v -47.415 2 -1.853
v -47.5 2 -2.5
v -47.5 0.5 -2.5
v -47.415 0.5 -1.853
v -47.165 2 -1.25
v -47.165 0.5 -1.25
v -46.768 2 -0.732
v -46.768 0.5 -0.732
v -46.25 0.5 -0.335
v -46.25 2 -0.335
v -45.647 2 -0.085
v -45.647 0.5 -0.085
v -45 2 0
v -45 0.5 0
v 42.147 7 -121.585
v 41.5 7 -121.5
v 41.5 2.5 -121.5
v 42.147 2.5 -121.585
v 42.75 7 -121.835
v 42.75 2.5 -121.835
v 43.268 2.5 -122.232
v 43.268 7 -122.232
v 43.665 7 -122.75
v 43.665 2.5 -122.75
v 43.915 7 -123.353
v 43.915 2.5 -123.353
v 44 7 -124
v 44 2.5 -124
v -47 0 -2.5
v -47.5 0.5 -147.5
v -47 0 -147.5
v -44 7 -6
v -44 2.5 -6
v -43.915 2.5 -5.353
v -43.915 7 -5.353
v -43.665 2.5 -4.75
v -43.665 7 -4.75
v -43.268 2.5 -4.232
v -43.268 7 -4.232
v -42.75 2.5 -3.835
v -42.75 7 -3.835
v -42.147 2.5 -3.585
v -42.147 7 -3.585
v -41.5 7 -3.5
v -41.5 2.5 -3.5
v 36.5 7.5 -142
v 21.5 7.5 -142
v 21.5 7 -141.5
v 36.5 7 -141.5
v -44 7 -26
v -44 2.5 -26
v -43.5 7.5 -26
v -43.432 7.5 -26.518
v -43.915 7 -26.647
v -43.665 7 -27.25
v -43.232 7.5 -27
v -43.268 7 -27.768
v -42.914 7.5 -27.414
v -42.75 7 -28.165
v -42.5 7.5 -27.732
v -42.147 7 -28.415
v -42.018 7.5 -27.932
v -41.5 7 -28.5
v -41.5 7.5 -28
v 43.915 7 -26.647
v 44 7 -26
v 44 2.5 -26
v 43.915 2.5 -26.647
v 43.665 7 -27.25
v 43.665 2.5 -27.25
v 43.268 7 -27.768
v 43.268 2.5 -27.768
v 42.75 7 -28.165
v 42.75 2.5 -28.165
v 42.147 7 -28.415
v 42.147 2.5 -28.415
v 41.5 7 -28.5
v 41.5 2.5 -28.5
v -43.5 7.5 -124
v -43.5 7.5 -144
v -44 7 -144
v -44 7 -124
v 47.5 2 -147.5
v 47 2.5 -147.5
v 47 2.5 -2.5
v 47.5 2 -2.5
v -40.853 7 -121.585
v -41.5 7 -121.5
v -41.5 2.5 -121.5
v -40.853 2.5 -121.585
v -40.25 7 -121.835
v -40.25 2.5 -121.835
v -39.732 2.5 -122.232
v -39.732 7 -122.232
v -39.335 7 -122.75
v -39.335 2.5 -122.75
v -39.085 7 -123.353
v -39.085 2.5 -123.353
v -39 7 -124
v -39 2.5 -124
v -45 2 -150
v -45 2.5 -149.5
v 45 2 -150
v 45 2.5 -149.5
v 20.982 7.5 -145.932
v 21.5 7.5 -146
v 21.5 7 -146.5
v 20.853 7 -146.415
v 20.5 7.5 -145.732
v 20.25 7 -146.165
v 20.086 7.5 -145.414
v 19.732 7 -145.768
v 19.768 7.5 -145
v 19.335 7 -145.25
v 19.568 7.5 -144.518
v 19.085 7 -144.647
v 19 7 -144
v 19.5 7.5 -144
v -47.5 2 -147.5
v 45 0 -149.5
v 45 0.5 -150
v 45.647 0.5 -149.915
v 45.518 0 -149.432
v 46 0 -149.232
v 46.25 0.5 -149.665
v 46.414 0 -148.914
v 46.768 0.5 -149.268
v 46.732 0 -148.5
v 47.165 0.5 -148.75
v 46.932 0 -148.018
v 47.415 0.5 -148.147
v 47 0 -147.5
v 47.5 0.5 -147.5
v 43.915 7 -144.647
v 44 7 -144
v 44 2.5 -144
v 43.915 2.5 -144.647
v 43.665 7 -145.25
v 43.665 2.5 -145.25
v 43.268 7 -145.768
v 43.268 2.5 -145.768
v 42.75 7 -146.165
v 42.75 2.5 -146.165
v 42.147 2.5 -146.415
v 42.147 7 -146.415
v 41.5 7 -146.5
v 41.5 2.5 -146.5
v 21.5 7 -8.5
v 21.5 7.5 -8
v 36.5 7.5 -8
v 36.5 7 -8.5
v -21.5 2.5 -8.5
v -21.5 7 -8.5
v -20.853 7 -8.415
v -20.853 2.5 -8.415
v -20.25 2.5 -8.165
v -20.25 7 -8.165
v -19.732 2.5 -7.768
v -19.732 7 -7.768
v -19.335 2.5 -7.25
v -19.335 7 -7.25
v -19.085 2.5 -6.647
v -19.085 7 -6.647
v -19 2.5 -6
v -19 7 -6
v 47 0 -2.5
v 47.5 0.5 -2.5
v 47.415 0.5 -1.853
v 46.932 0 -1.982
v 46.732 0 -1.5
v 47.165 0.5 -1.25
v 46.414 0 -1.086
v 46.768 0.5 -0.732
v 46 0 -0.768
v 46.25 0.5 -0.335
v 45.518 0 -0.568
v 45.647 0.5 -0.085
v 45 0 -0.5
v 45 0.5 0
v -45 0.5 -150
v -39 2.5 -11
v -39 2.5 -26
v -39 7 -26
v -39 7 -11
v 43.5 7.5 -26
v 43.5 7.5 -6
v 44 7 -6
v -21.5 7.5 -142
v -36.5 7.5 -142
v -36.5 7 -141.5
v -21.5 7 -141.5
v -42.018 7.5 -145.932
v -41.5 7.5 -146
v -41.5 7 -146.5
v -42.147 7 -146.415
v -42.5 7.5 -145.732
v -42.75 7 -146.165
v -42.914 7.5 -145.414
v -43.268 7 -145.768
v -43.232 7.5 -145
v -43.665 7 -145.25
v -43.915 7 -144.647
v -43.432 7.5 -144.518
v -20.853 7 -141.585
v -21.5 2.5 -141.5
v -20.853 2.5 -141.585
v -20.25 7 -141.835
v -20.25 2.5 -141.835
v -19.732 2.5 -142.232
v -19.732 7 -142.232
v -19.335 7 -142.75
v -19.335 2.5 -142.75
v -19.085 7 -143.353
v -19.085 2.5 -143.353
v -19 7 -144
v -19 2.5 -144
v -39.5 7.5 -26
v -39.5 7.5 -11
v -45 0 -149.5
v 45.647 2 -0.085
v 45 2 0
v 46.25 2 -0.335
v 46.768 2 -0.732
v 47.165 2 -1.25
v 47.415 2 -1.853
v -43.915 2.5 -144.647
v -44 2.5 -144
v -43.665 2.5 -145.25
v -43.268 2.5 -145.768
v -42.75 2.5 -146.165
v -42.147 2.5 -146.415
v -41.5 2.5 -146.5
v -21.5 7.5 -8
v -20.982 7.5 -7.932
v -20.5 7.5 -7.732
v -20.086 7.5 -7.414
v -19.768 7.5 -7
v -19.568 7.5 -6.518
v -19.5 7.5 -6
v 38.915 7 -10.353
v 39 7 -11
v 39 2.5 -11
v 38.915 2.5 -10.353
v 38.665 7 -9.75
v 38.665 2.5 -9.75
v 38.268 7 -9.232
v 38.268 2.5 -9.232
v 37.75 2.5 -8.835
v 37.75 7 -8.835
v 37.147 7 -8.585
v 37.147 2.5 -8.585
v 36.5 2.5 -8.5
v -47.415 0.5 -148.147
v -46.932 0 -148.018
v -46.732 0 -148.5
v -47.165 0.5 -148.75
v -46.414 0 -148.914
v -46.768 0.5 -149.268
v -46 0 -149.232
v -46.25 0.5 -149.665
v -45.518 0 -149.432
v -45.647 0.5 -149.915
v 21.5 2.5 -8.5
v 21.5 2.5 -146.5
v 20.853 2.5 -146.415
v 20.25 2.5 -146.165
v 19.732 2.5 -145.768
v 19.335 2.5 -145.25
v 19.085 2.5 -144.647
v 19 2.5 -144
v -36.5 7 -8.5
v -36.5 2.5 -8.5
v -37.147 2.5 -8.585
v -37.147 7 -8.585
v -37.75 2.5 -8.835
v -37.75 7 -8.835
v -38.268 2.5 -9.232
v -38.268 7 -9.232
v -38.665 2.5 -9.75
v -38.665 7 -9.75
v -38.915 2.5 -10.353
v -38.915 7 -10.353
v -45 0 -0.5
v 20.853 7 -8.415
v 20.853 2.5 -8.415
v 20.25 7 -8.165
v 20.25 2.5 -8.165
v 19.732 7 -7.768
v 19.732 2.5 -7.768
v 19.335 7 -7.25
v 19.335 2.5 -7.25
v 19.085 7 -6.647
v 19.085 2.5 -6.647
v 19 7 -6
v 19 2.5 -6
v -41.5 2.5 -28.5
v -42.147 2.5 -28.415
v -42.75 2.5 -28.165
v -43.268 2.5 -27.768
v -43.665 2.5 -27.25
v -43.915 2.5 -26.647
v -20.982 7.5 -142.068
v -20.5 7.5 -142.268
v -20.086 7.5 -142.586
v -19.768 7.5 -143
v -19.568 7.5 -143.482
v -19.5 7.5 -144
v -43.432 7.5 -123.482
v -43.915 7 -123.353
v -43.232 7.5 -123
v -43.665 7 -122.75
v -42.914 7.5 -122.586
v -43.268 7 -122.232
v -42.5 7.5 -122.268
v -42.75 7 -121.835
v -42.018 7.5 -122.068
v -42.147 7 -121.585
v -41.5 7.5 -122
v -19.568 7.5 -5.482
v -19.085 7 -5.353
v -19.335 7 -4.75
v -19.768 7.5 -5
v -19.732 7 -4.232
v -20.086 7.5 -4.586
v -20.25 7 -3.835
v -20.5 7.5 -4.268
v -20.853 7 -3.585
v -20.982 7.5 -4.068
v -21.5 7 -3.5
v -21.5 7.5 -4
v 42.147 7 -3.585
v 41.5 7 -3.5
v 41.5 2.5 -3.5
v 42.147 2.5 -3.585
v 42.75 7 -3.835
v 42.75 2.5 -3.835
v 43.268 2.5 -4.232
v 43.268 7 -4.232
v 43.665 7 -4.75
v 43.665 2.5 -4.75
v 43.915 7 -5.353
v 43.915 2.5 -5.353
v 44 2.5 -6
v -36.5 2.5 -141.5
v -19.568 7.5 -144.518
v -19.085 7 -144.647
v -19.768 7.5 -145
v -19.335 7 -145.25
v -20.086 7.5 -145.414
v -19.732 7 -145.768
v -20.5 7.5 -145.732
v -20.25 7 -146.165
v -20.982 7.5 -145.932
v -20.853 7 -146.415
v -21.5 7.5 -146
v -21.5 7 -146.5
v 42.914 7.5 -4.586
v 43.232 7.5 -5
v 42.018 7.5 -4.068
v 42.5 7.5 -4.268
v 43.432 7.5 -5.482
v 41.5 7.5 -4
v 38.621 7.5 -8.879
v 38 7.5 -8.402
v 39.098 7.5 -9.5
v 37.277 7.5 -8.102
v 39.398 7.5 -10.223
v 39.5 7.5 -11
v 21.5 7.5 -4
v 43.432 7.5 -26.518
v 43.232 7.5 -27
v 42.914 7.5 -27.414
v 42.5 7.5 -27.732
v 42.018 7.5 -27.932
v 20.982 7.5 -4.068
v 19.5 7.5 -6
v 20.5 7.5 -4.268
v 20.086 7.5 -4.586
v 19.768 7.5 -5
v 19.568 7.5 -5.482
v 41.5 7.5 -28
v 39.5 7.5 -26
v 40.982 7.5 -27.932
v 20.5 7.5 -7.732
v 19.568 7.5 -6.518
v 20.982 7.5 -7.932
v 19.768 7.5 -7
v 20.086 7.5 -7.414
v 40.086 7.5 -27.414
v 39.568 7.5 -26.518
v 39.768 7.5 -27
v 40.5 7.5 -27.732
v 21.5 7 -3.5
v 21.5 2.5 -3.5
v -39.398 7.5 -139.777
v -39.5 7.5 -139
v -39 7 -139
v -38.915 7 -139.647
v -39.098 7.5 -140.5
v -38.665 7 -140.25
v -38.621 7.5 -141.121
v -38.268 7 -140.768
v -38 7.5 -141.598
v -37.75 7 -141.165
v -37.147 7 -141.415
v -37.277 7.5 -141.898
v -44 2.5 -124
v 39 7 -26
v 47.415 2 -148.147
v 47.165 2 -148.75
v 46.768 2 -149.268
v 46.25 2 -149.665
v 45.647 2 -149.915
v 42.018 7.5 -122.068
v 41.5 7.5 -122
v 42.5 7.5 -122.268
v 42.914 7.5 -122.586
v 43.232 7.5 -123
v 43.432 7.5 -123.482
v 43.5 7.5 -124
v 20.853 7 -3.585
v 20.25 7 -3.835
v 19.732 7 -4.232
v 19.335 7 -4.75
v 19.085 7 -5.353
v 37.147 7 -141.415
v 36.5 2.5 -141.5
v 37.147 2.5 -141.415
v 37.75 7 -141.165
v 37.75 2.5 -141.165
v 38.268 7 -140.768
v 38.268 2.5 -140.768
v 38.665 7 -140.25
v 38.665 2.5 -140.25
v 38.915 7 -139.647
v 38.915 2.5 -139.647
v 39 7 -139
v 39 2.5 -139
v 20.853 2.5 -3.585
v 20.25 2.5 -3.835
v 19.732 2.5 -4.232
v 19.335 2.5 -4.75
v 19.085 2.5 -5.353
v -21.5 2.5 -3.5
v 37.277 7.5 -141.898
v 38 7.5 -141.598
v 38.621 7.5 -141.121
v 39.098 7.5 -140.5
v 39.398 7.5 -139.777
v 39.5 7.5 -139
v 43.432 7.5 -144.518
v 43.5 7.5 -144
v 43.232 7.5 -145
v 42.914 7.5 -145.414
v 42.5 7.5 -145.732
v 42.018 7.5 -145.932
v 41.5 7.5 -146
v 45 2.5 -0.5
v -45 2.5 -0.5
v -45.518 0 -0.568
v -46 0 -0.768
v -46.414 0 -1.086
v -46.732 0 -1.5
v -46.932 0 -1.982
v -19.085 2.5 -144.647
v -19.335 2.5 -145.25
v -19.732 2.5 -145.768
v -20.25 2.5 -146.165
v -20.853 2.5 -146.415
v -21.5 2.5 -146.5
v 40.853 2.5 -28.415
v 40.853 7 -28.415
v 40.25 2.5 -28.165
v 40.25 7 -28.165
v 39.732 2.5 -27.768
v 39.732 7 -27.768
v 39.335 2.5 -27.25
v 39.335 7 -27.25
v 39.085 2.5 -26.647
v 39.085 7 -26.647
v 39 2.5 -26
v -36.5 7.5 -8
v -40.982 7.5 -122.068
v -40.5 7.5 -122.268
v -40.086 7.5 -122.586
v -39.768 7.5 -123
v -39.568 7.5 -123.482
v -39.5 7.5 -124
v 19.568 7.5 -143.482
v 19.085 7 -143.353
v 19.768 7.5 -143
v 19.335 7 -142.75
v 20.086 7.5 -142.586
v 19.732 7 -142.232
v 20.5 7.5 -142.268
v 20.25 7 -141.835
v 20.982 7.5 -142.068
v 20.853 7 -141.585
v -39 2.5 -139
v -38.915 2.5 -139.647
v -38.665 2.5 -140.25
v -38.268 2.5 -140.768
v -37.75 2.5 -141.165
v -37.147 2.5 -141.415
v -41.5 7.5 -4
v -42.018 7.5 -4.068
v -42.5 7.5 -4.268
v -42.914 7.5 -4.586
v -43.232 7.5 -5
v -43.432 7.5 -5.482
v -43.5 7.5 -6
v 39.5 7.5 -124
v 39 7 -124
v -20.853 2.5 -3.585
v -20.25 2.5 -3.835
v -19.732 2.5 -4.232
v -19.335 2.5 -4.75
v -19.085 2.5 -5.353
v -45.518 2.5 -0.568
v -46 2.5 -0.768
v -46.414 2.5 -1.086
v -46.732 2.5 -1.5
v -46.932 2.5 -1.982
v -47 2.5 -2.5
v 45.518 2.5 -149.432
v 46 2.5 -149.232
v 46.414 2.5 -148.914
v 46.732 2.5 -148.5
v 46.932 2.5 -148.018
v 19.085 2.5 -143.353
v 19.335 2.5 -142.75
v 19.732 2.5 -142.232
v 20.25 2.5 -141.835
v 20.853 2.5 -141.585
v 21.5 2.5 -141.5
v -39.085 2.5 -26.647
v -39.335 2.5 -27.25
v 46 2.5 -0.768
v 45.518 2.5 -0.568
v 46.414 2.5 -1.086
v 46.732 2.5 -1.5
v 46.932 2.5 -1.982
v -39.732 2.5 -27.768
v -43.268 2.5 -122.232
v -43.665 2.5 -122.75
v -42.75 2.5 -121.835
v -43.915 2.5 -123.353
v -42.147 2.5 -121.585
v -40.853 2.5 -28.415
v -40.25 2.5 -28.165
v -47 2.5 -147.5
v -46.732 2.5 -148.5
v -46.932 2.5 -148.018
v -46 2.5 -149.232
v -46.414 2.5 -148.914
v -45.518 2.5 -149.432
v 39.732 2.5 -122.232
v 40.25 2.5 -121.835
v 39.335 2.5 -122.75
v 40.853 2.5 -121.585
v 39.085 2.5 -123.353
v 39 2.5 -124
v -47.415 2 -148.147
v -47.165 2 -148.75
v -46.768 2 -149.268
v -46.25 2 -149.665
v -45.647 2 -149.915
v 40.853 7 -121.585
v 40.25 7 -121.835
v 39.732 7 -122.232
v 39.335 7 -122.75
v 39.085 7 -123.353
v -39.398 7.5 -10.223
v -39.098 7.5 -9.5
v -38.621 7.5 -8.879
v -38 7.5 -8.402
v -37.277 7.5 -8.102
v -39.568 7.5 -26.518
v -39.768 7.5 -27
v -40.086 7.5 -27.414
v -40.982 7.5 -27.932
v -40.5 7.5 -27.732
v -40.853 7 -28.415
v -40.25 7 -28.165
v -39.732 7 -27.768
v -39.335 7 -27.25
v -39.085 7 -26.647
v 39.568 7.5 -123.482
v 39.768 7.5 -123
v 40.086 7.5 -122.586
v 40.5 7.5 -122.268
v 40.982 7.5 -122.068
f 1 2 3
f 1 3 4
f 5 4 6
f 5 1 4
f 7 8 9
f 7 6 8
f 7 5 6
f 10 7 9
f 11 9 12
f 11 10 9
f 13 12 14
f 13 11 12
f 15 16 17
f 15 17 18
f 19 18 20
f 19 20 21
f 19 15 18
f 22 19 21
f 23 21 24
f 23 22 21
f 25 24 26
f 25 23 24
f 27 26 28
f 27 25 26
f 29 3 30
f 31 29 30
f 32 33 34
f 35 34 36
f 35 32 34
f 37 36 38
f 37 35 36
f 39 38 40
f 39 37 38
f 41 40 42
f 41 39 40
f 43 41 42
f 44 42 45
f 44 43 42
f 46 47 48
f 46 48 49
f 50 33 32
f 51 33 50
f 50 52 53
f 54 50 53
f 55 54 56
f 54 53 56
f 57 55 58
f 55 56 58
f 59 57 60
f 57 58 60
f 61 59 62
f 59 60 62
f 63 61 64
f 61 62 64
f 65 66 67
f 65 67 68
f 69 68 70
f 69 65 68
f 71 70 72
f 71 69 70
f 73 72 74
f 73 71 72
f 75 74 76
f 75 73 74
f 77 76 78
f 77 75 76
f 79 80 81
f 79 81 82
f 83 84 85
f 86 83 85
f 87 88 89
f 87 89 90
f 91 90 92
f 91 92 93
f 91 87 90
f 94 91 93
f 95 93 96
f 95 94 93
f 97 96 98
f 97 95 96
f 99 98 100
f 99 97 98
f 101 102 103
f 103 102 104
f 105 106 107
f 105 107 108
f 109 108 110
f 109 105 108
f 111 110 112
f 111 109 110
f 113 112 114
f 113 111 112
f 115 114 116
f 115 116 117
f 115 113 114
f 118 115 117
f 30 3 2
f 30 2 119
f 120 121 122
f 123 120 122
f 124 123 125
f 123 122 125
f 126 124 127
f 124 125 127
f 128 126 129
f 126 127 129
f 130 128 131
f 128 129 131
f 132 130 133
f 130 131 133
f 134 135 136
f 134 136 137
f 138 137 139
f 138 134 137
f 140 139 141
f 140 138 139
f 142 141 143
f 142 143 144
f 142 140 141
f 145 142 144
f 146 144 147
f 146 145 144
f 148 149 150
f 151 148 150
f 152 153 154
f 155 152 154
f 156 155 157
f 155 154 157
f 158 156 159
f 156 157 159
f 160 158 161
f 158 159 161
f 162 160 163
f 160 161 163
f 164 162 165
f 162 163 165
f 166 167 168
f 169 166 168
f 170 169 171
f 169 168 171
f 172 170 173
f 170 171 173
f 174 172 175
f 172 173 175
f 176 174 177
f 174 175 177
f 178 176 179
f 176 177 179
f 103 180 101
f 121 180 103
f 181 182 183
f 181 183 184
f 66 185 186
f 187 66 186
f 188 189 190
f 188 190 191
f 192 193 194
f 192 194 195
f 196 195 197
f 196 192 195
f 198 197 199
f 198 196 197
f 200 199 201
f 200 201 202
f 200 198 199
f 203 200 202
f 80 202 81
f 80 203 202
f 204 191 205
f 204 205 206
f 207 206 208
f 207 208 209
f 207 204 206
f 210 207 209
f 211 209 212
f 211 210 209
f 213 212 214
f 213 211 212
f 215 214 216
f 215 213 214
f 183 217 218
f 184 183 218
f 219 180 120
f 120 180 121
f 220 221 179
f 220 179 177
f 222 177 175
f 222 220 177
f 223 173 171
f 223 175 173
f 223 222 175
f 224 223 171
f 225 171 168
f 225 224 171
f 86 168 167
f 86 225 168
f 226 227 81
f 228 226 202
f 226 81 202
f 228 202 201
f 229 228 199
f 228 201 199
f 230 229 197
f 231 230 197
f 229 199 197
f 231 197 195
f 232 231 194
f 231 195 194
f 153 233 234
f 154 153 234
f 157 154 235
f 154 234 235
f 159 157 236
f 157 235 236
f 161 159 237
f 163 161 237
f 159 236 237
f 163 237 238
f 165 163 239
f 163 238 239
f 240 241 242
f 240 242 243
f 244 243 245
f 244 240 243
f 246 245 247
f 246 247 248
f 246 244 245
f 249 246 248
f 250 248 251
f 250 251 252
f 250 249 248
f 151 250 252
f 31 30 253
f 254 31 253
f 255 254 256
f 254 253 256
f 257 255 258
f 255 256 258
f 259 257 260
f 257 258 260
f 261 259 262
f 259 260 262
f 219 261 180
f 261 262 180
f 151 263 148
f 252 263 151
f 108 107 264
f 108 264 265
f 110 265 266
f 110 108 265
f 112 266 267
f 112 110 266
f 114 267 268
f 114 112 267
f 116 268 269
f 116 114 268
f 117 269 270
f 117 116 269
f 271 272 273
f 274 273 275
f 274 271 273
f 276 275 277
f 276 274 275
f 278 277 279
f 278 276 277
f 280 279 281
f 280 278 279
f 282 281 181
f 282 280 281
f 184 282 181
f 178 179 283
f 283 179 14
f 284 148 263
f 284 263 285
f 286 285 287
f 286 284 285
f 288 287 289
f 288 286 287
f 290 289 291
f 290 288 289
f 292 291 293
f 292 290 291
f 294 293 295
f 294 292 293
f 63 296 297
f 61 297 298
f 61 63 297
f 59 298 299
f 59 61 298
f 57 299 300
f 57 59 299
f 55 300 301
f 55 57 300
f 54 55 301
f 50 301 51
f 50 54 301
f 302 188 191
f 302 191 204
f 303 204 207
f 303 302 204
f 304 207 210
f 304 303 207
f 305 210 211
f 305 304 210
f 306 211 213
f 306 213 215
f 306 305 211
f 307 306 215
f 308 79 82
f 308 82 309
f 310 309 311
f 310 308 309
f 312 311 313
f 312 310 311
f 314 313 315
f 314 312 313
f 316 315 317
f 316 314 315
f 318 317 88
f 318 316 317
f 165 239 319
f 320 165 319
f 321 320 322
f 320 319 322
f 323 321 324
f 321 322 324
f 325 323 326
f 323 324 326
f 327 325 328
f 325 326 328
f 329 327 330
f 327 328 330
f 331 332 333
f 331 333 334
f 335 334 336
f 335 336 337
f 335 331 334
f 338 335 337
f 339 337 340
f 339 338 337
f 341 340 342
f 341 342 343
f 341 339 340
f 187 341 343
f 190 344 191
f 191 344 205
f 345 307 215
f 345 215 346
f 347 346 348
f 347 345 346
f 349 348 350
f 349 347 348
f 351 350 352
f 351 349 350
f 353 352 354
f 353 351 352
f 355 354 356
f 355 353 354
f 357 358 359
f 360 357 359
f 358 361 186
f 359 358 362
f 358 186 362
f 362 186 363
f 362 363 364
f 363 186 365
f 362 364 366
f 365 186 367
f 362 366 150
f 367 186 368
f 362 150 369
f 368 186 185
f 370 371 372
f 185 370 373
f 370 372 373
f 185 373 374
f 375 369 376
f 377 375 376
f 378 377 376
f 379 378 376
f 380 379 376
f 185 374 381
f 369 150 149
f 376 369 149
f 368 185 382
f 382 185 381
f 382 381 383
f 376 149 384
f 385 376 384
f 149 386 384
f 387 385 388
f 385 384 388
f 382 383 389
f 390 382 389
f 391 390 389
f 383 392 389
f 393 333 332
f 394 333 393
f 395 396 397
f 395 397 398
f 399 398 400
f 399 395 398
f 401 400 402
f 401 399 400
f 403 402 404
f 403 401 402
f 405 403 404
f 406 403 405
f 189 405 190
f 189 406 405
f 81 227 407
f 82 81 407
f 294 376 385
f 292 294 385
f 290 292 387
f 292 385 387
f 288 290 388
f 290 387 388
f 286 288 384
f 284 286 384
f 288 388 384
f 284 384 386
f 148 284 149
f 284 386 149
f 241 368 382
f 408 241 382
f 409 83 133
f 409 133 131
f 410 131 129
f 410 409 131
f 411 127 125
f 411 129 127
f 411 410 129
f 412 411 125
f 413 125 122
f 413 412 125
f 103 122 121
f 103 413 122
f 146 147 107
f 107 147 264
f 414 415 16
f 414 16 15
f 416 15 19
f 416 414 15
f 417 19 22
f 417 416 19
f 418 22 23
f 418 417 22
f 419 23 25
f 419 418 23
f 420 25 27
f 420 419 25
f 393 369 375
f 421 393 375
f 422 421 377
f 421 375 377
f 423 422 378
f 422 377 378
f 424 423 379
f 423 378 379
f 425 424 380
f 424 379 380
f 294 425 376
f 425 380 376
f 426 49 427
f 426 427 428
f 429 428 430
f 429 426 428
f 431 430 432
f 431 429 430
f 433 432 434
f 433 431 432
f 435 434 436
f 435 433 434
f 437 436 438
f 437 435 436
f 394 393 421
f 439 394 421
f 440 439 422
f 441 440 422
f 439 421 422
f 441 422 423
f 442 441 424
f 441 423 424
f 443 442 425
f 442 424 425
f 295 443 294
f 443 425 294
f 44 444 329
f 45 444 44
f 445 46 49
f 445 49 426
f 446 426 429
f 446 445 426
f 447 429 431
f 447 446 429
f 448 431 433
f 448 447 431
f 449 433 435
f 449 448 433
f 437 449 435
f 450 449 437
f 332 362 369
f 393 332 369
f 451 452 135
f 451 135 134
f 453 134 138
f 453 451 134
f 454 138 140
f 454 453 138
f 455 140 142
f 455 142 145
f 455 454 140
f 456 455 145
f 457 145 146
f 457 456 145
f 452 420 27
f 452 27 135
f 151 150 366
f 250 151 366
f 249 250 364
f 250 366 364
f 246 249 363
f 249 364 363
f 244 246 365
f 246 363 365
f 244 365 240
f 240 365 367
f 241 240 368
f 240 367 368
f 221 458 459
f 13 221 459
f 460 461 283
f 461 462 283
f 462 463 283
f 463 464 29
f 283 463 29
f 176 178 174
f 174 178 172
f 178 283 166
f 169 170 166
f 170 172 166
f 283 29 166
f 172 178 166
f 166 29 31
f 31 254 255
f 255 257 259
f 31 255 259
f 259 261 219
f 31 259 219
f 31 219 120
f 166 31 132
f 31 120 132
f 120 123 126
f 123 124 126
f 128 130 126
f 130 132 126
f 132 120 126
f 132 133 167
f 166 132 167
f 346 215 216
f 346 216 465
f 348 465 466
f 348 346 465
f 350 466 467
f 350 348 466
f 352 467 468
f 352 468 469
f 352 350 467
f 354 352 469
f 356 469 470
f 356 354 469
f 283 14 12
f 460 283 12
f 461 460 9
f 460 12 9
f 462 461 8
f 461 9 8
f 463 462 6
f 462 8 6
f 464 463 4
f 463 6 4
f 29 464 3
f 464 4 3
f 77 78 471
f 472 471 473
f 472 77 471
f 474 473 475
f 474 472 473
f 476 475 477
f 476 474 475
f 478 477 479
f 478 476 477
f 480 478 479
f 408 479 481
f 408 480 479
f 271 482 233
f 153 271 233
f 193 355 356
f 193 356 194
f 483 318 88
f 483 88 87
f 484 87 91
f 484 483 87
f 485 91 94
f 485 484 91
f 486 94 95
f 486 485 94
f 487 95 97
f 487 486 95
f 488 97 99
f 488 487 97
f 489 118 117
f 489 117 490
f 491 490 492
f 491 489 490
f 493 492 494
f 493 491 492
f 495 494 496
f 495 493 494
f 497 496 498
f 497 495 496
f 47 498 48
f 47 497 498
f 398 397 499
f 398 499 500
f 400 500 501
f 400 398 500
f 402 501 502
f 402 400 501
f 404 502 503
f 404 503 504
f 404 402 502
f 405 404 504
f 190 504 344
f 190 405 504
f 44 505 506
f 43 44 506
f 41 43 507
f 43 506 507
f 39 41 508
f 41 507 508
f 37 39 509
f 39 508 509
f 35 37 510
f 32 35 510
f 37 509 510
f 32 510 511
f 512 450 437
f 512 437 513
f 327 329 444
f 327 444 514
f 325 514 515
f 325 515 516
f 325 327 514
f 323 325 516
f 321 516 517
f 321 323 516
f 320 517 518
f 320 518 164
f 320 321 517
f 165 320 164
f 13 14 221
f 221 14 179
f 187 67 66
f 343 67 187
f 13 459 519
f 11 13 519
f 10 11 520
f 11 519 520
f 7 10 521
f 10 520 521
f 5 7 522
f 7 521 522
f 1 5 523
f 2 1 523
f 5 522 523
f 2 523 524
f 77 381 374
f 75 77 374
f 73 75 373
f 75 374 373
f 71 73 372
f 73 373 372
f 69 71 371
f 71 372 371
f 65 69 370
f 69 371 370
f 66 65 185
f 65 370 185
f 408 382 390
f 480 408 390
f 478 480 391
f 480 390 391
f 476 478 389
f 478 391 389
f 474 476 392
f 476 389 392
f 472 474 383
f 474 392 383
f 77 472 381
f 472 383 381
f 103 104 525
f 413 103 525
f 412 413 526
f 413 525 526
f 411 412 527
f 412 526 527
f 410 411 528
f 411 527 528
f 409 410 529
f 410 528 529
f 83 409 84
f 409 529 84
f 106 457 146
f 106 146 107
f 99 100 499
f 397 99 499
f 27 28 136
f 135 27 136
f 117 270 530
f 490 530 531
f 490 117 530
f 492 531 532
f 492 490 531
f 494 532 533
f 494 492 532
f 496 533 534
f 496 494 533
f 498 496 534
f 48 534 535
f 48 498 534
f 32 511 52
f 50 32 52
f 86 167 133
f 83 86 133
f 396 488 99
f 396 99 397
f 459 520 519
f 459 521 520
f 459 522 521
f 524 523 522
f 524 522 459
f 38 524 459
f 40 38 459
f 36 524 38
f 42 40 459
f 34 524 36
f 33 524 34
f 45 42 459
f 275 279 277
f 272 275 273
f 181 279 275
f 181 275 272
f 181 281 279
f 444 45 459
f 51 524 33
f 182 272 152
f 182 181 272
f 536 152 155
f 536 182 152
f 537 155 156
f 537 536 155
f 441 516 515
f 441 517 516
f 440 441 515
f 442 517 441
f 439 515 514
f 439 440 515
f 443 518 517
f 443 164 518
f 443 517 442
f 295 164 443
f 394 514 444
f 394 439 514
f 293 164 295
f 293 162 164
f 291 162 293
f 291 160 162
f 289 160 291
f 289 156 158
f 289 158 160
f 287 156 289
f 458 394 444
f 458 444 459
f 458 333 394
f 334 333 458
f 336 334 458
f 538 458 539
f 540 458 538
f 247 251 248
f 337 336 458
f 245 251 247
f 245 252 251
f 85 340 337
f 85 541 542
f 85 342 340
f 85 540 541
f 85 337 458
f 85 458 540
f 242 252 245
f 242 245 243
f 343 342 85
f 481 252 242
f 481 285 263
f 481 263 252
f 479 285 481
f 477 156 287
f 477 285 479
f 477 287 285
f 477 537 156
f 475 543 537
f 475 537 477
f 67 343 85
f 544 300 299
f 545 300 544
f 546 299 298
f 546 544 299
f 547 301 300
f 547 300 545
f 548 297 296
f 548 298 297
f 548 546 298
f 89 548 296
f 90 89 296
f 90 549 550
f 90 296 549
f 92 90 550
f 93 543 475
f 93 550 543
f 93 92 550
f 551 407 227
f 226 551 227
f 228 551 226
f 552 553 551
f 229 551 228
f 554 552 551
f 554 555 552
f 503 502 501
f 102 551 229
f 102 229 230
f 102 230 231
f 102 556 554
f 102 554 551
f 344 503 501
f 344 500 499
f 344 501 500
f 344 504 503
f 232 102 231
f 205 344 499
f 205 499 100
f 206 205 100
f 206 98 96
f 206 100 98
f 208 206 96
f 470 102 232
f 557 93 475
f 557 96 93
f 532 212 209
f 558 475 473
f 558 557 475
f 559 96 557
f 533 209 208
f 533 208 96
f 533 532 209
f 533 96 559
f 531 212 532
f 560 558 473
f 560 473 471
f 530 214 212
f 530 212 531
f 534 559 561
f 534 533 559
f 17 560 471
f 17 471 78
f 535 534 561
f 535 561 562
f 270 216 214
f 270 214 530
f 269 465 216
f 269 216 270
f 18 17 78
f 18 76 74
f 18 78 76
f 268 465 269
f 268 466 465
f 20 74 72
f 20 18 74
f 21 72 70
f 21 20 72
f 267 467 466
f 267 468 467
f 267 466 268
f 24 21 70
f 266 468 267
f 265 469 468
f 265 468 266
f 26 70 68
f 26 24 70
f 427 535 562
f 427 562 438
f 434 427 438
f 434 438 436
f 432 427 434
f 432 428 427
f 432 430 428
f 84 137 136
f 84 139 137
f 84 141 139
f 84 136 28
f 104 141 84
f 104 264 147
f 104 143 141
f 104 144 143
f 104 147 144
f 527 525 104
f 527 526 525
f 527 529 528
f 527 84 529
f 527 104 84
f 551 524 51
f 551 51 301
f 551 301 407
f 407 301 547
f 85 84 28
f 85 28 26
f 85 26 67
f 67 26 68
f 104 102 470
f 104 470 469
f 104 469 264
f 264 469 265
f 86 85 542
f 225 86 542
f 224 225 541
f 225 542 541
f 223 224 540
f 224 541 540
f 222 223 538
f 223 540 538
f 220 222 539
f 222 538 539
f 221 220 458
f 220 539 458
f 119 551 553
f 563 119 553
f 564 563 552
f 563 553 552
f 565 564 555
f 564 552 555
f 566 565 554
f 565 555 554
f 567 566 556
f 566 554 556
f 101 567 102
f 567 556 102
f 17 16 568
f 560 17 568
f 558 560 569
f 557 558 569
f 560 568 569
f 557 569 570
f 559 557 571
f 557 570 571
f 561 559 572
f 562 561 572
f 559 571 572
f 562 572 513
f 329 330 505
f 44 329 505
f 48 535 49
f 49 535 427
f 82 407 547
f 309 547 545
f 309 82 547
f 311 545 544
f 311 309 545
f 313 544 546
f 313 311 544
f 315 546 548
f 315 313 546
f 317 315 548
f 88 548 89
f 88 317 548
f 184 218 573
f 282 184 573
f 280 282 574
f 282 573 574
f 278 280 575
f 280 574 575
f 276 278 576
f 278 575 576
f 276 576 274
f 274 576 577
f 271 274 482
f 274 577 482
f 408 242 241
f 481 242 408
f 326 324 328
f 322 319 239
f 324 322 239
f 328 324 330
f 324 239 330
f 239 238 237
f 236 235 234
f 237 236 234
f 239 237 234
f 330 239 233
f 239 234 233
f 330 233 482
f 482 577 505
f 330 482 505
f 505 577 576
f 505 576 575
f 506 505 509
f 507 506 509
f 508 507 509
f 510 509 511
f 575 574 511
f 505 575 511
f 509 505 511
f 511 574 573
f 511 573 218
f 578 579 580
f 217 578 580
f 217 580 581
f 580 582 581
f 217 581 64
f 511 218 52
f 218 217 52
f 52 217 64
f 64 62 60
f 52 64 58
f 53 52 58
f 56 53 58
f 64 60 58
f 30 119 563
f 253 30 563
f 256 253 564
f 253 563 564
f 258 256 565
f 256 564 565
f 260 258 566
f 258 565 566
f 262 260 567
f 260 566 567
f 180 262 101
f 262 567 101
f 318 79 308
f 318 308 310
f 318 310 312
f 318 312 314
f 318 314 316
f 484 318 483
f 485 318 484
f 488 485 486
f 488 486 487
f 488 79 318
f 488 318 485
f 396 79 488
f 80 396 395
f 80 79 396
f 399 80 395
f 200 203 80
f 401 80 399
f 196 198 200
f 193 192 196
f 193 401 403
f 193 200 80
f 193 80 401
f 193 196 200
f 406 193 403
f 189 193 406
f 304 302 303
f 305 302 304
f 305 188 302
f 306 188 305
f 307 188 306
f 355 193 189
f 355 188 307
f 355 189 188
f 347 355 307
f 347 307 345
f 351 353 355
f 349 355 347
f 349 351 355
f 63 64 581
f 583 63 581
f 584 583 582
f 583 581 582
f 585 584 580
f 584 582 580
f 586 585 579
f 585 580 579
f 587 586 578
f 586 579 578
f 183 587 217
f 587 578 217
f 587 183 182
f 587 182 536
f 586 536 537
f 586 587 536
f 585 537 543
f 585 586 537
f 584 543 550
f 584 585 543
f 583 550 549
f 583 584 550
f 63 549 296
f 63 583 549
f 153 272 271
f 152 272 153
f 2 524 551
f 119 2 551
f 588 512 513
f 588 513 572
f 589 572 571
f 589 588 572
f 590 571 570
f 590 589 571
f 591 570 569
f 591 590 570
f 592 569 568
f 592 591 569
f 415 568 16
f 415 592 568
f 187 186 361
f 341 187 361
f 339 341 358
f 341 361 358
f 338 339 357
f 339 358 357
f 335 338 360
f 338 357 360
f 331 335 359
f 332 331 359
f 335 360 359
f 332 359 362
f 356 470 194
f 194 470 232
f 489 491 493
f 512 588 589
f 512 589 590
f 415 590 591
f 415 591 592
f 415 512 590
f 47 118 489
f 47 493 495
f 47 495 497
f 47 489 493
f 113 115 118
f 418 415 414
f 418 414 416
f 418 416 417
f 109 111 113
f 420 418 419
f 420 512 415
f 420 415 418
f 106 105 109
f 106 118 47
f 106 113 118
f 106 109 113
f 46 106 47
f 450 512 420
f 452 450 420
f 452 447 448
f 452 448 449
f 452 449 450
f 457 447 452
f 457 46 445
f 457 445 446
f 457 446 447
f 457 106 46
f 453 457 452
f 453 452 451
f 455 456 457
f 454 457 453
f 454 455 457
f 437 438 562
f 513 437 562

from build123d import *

# Parameters (mm, degrees)
SKETCH1_W           = 95
SKETCH1_H           = 150
SKETCH1_W_2         = 90
SKETCH1_H_2         = 145
BOSS_EXTRUDE1_DEPTH = 2.5
BOSS_EXTRUDE2_DEPTH = 5
FILLET1_R           = 2.5
CHAMFER1_SIZE       = 0.5


with BuildPart() as part:
    # Sketch1 → Boss-Extrude1 (new body)
    # profile 1 of 2: a face of its own
    with BuildSketch(Plane(origin=(0, 0, 0), x_dir=(1, 0, 0), z_dir=(0, 1, 0))):
        with Locations((0, 75)):
            Rectangle(SKETCH1_W, SKETCH1_H)
        with Locations((0, 75)):
            Rectangle(SKETCH1_W_2, SKETCH1_H_2, mode=Mode.SUBTRACT)
    # profile 2 of 2: a face of its own
    with BuildSketch(Plane(origin=(0, 0, 0), x_dir=(1, 0, 0), z_dir=(0, 1, 0))):
        with Locations((0, 75)):
            Rectangle(SKETCH1_W_2, SKETCH1_H_2)
    extrude(amount=BOSS_EXTRUDE1_DEPTH)

    # Sketch2 → Boss-Extrude2 (add)
    with BuildSketch(Plane(origin=(0, 2.5, 0), x_dir=(1, 0, 0), z_dir=(0, 1, 0))):
        Polygon((-19, 8.5), (-19, 3.5), (-44, 3.5), (-44, 28.5), (-39, 28.5), (-39, 8.5), align=None)
        Polygon((19, 3.5), (19, 8.5), (39, 8.5), (39, 28.5), (44, 28.5), (44, 3.5), align=None)
        Polygon((-44, 146.5), (-44, 121.5), (-39, 121.5), (-39, 141.5), (-19, 141.5), (-19, 146.5), align=None)
        Polygon((39, 121.5), (44, 121.5), (44, 146.5), (19, 146.5), (19, 141.5), (39, 141.5), align=None)
    extrude(amount=BOSS_EXTRUDE2_DEPTH)

    # Fillet1
    fillet1_edges = [part.edges().sort_by_distance(p)[0] for p in [
        (47.5, 1.25, -150),
        (47.5, 1.25, 0),
        (-47.5, 1.25, 0),
        (-47.5, 1.25, -150),
        (44, 5, -146.5),
        (19, 5, -146.5),
        (19, 5, -141.5),
        (39, 5, -141.5),
        (39, 5, -121.5),
        (44, 5, -121.5),
        (-19, 5, -8.5),
        (-39, 5, -8.5),
        (-39, 5, -28.5),
        (-44, 5, -28.5),
        (-44, 5, -3.5),
        (-19, 5, -3.5),
        (-19, 5, -146.5),
        (-44, 5, -121.5),
        (-39, 5, -121.5),
        (-39, 5, -141.5),
        (-19, 5, -141.5),
        (19, 5, -3.5),
        (44, 5, -3.5),
        (44, 5, -28.5),
        (39, 5, -28.5),
        (39, 5, -8.5),
        (19, 5, -8.5),
        (-44, 5, -146.5),
    ]]
    fillet(fillet1_edges, radius=FILLET1_R - 0.0001)  # a hair under: the kernel refuses the full size

    # Chamfer1
    chamfer1_edges = [part.edges().sort_by_distance(p)[0] for p in [
        (-47.5, 2.5, -75),
        (0, 2.5, 0),
        (-46.767796242, 2.5, -149.267796242),
        (-46.767796242, 2.5, -0.732203758),
        (46.767796242, 2.5, -0.732203758),
        (46.767796242, 2.5, -149.267796242),
        (31.5, 7.5, -146.5),
        (44, 7.5, -134),
        (29, 7.5, -141.5),
        (39, 7.5, -131.5),
        (43.267796242, 7.5, -122.232203758),
        (39.732203758, 7.5, -122.232203758),
        (19.732203758, 7.5, -142.232203758),
        (19.732203758, 7.5, -145.767796242),
        (43.267796242, 7.5, -145.767796242),
        (-29, 7.5, -8.5),
        (-39, 7.5, -18.5),
        (-44, 7.5, -16),
        (-31.5, 7.5, -3.5),
        (-19.732203758, 7.5, -4.232203758),
        (-19.732203758, 7.5, -7.767796242),
        (-43.267796242, 7.5, -4.232203758),
        (-43.267796242, 7.5, -27.767796242),
        (-39.732203758, 7.5, -27.767796242),
        (-31.5, 7.5, -146.5),
        (-44, 7.5, -134),
        (-39, 7.5, -131.5),
        (-29, 7.5, -141.5),
        (-43.267796242, 7.5, -145.767796242),
        (-19.732203758, 7.5, -142.232203758),
        (-19.732203758, 7.5, -145.767796242),
        (-39.732203758, 7.5, -122.232203758),
        (-43.267796242, 7.5, -122.232203758),
        (31.5, 7.5, -3.5),
        (44, 7.5, -16),
        (39, 7.5, -18.5),
        (29, 7.5, -8.5),
        (19.732203758, 7.5, -7.767796242),
        (19.732203758, 7.5, -4.232203758),
        (39.732203758, 7.5, -27.767796242),
        (43.267796242, 7.5, -27.767796242),
        (43.267796242, 7.5, -4.232203758),
        (38.267796242, 7.5, -140.767796242),
        (-38.267796242, 7.5, -9.232203758),
        (-38.267796242, 7.5, -140.767796242),
        (38.267796242, 7.5, -9.232203758),
        (0, 0, -150),
        (0, 2.5, -150),
        (47.5, 0, -75),
        (0, 0, 0),
        (-47.5, 0, -75),
        (-46.767796242, 0, -149.267796242),
        (-46.767796242, 0, -0.732203758),
        (46.767796242, 0, -0.732203758),
        (46.767796242, 0, -149.267796242),
        (47.5, 2.5, -75),
    ]]
    chamfer(chamfer1_edges, length=CHAMFER1_SIZE)


solid = part.part
